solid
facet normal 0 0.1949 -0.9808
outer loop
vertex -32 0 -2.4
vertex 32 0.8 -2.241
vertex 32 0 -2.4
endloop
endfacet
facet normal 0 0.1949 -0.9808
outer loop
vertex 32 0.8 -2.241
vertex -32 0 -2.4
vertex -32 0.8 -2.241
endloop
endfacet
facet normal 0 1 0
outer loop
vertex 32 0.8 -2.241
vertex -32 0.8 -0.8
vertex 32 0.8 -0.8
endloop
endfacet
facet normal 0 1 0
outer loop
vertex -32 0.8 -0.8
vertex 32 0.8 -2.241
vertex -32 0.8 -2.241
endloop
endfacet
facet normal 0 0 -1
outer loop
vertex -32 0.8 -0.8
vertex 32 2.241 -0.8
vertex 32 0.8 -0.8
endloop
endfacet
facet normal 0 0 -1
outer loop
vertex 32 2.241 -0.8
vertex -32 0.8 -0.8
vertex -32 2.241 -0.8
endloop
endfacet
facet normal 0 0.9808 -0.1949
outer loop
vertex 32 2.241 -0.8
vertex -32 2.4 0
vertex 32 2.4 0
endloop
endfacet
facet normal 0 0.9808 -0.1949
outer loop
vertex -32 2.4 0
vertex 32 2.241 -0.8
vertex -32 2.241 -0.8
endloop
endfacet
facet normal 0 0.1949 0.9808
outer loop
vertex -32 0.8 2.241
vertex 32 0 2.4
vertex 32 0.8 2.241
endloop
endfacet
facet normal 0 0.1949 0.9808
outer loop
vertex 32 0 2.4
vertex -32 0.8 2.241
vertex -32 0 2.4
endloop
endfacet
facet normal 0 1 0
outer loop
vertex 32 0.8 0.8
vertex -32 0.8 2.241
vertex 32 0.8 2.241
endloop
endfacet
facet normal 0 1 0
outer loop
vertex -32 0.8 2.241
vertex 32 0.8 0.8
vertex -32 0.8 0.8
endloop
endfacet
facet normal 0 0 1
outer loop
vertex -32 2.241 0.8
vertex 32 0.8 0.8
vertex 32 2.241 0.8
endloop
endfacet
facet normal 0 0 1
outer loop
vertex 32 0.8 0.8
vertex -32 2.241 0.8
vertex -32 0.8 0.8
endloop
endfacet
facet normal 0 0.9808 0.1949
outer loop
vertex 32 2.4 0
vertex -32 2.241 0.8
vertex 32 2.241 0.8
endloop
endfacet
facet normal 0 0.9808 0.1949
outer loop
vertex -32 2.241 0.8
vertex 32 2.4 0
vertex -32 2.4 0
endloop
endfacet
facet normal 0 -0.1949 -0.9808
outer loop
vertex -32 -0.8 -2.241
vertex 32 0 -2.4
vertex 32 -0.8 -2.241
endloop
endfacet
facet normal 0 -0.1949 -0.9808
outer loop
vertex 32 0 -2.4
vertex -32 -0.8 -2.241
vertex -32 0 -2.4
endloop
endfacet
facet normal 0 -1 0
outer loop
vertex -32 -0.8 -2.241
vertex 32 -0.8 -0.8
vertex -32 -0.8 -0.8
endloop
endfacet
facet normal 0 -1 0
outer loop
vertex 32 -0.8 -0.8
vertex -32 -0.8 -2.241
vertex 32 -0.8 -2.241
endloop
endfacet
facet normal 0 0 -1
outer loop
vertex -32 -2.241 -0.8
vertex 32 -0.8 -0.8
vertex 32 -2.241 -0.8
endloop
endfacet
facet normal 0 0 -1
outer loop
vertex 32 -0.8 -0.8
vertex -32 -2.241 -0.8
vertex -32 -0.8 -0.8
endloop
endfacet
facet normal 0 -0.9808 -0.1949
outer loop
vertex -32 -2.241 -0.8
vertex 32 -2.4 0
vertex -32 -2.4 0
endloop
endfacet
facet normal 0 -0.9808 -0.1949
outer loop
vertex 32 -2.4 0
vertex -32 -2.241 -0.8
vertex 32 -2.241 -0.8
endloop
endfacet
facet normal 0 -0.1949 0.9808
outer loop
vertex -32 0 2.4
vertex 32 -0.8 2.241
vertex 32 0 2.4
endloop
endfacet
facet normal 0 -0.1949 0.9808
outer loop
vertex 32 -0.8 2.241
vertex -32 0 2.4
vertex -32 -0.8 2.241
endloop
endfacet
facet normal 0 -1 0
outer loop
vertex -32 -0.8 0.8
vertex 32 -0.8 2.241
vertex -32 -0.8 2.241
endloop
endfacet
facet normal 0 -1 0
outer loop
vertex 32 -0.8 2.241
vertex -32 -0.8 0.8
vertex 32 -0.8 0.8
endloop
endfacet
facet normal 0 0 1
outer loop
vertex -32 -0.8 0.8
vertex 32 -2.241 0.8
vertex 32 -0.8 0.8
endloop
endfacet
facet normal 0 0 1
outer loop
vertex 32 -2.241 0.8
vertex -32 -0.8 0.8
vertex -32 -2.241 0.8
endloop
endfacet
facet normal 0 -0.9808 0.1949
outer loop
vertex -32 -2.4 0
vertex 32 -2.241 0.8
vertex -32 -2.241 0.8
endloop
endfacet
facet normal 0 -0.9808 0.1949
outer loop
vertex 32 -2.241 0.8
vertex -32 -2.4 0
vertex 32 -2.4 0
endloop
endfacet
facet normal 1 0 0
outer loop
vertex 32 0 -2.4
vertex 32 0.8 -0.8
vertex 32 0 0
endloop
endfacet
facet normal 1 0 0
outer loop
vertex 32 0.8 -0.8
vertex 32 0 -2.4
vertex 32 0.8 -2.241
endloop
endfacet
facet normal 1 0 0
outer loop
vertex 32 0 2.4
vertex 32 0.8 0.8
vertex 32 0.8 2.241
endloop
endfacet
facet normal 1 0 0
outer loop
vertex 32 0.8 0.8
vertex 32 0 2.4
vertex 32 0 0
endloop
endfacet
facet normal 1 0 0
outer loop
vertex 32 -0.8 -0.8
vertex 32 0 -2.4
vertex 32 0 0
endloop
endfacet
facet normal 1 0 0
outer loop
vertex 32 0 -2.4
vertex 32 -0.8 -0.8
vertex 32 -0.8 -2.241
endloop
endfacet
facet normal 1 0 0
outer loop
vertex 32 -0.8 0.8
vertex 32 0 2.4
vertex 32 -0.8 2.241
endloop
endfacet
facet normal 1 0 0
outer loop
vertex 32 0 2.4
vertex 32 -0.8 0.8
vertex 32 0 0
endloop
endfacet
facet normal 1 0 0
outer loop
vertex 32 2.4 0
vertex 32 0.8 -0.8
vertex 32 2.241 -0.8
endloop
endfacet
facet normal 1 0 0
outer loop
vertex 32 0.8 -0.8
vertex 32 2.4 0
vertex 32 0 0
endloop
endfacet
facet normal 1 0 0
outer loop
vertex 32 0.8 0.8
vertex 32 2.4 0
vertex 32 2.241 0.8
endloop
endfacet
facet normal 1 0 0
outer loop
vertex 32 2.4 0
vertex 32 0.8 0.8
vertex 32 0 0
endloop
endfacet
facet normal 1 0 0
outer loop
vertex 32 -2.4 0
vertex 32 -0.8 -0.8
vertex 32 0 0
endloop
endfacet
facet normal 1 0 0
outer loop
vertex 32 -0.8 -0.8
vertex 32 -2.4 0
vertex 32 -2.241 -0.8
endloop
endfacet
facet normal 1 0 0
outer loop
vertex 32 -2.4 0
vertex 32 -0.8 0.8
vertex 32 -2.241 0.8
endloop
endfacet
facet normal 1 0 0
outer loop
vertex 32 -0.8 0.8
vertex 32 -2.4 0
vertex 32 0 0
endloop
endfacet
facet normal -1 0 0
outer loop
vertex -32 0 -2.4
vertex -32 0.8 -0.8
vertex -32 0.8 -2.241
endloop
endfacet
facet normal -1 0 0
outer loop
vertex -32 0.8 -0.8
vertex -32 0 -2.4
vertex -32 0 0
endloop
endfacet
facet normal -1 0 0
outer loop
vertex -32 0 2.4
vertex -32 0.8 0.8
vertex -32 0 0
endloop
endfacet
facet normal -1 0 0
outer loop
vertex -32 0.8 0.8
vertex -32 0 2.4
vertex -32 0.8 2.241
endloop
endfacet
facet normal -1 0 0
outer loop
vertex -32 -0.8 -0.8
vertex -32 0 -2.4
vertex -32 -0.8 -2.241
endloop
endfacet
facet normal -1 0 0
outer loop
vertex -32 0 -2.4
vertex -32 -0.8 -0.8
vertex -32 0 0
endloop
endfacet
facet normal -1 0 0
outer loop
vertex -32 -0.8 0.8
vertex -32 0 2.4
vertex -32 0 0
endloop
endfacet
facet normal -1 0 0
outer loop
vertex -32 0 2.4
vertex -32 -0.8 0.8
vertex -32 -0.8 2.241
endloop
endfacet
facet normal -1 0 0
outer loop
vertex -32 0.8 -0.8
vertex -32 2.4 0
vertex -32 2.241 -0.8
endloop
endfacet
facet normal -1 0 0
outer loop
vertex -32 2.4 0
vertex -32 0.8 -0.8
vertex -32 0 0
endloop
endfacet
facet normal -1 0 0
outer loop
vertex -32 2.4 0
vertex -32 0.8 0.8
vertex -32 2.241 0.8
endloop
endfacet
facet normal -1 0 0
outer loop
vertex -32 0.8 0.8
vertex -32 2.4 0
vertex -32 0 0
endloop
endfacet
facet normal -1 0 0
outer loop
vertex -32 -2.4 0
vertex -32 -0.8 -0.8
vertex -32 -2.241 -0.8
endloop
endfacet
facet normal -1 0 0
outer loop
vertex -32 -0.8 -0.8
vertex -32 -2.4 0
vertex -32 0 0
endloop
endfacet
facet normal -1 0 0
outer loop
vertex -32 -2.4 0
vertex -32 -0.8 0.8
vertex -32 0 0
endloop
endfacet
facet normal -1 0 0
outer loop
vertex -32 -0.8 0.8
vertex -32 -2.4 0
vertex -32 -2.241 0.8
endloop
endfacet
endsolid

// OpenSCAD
// file: ../p/axle.scad
use <../lib.scad>
function ldraw_lib__axle() = [
// 0 Axle
// 0 Name: axle.dat
// 0 Author: James Jessiman
// 0 !LDRAW_ORG Primitive UPDATE 2003-01
// 0 !LICENSE Licensed under CC BY 2.0 and CC BY 4.0 : see CAreadme.txt
// 
// 0 BFC CERTIFY CCW
  [0,"BFC","CERTIFY"],
  [0,"BFC","CCW"],
// 
// 0 !HISTORY 2000-04-23 [sbliss] Added conditional edges along outermost diameters
// 0 !HISTORY 2000-05-07 [PTadmin] Official Update 2000-01
// 0 !HISTORY 2002-11-08 [OrionP] Adjusted fit and precision
// 0 !HISTORY 2003-03-12 [PTadmin] Official Update 2003-01
// 0 !HISTORY 2007-06-24 [PTadmin] Header formatted for Contributor Agreement
// 0 !HISTORY 2008-07-01 [PTadmin] Official Update 2008-01
// 
// 
// 5 24 6 0 0 6 1 0 5.602 0 2 5.602 0 -2
  [5,24,6,0,0,6,1,0,5.602,0,2,5.602,0,-2],
// 5 24 0 0 6 0 1 6 2 0 5.602 -2 0 5.602
  [5,24,0,0,6,0,1,6,2,0,5.602,-2,0,5.602],
// 5 24 -6 0 0 -6 1 0 -5.602 0 -2 -5.602 0 2
  [5,24,-6,0,0,-6,1,0,-5.602,0,-2,-5.602,0,2],
// 5 24 0 0 -6 0 1 -6 -2 0 -5.602 2 0 -5.602
  [5,24,0,0,-6,0,1,-6,-2,0,-5.602,2,0,-5.602],
// 
// 2 24 6 0 0 5.602 0 2
  [2,24,6,0,0,5.602,0,2],
// 2 24 5.602 0 2 2 0 2
  [2,24,5.602,0,2,2,0,2],
// 2 24 2 0 2 2 0 5.602
  [2,24,2,0,2,2,0,5.602],
// 2 24 2 0 5.602 0 0 6
  [2,24,2,0,5.602,0,0,6],
// 2 24 -6 0 0 -5.602 0 2
  [2,24,-6,0,0,-5.602,0,2],
// 2 24 -5.602 0 2 -2 0 2
  [2,24,-5.602,0,2,-2,0,2],
// 2 24 -2 0 2 -2 0 5.602
  [2,24,-2,0,2,-2,0,5.602],
// 2 24 -2 0 5.602 -0 0 6
  [2,24,-2,0,5.602,-0,0,6],
// 2 24 6 0 -0 5.602 0 -2
  [2,24,6,0,-0,5.602,0,-2],
// 2 24 5.602 0 -2 2 0 -2
  [2,24,5.602,0,-2,2,0,-2],
// 2 24 2 0 -2 2 0 -5.602
  [2,24,2,0,-2,2,0,-5.602],
// 2 24 2 0 -5.602 0 0 -6
  [2,24,2,0,-5.602,0,0,-6],
// 2 24 -6 0 -0 -5.602 0 -2
  [2,24,-6,0,-0,-5.602,0,-2],
// 2 24 -5.602 0 -2 -2 0 -2
  [2,24,-5.602,0,-2,-2,0,-2],
// 2 24 -2 0 -2 -2 0 -5.602
  [2,24,-2,0,-2,-2,0,-5.602],
// 2 24 -2 0 -5.602 -0 0 -6
  [2,24,-2,0,-5.602,-0,0,-6],
// 2 24 6 1 0 5.602 1 2
  [2,24,6,1,0,5.602,1,2],
// 2 24 5.602 1 2 2 1 2
  [2,24,5.602,1,2,2,1,2],
// 2 24 2 1 2 2 1 5.602
  [2,24,2,1,2,2,1,5.602],
// 2 24 2 1 5.602 0 1 6
  [2,24,2,1,5.602,0,1,6],
// 2 24 -6 1 0 -5.602 1 2
  [2,24,-6,1,0,-5.602,1,2],
// 2 24 -5.602 1 2 -2 1 2
  [2,24,-5.602,1,2,-2,1,2],
// 2 24 -2 1 2 -2 1 5.602
  [2,24,-2,1,2,-2,1,5.602],
// 2 24 -2 1 5.602 -0 1 6
  [2,24,-2,1,5.602,-0,1,6],
// 2 24 6 1 -0 5.602 1 -2
  [2,24,6,1,-0,5.602,1,-2],
// 2 24 5.602 1 -2 2 1 -2
  [2,24,5.602,1,-2,2,1,-2],
// 2 24 2 1 -2 2 1 -5.602
  [2,24,2,1,-2,2,1,-5.602],
// 2 24 2 1 -5.602 0 1 -6
  [2,24,2,1,-5.602,0,1,-6],
// 2 24 -6 1 -0 -5.602 1 -2
  [2,24,-6,1,-0,-5.602,1,-2],
// 2 24 -5.602 1 -2 -2 1 -2
  [2,24,-5.602,1,-2,-2,1,-2],
// 2 24 -2 1 -2 -2 1 -5.602
  [2,24,-2,1,-2,-2,1,-5.602],
// 2 24 -2 1 -5.602 -0 1 -6
  [2,24,-2,1,-5.602,-0,1,-6],
// 
// 2 24 5.602 0 2 5.602 1 2
  [2,24,5.602,0,2,5.602,1,2],
// 2 24 2 0 2 2 1 2
  [2,24,2,0,2,2,1,2],
// 2 24 2 0 5.602 2 1 5.602
  [2,24,2,0,5.602,2,1,5.602],
// 2 24 -5.602 0 2 -5.602 1 2
  [2,24,-5.602,0,2,-5.602,1,2],
// 2 24 -2 0 2 -2 1 2
  [2,24,-2,0,2,-2,1,2],
// 2 24 -2 0 5.602 -2 1 5.602
  [2,24,-2,0,5.602,-2,1,5.602],
// 2 24 5.602 0 -2 5.602 1 -2
  [2,24,5.602,0,-2,5.602,1,-2],
// 2 24 2 0 -2 2 1 -2
  [2,24,2,0,-2,2,1,-2],
// 2 24 2 0 -5.602 2 1 -5.602
  [2,24,2,0,-5.602,2,1,-5.602],
// 2 24 -5.602 0 -2 -5.602 1 -2
  [2,24,-5.602,0,-2,-5.602,1,-2],
// 2 24 -2 0 -2 -2 1 -2
  [2,24,-2,0,-2,-2,1,-2],
// 2 24 -2 0 -5.602 -2 1 -5.602
  [2,24,-2,0,-5.602,-2,1,-5.602],
// 
// 4 16 6 0 0 6 1 0 5.602 1 2 5.602 0 2
  [4,16,6,0,0,6,1,0,5.602,1,2,5.602,0,2],
// 4 16 5.602 0 2 5.602 1 2 2 1 2 2 0 2
  [4,16,5.602,0,2,5.602,1,2,2,1,2,2,0,2],
// 4 16 2 0 2 2 1 2 2 1 5.602 2 0 5.602
  [4,16,2,0,2,2,1,2,2,1,5.602,2,0,5.602],
// 4 16 2 0 5.602 2 1 5.602 0 1 6 0 0 6
  [4,16,2,0,5.602,2,1,5.602,0,1,6,0,0,6],
// 4 16 -6 0 0 -5.602 0 2 -5.602 1 2 -6 1 0
  [4,16,-6,0,0,-5.602,0,2,-5.602,1,2,-6,1,0],
// 4 16 -5.602 0 2 -2 0 2 -2 1 2 -5.602 1 2
  [4,16,-5.602,0,2,-2,0,2,-2,1,2,-5.602,1,2],
// 4 16 -2 0 2 -2 0 5.602 -2 1 5.602 -2 1 2
  [4,16,-2,0,2,-2,0,5.602,-2,1,5.602,-2,1,2],
// 4 16 -2 0 5.602 -0 0 6 -0 1 6 -2 1 5.602
  [4,16,-2,0,5.602,-0,0,6,-0,1,6,-2,1,5.602],
// 4 16 6 0 -0 5.602 0 -2 5.602 1 -2 6 1 -0
  [4,16,6,0,-0,5.602,0,-2,5.602,1,-2,6,1,-0],
// 4 16 5.602 0 -2 2 0 -2 2 1 -2 5.602 1 -2
  [4,16,5.602,0,-2,2,0,-2,2,1,-2,5.602,1,-2],
// 4 16 2 0 -2 2 0 -5.602 2 1 -5.602 2 1 -2
  [4,16,2,0,-2,2,0,-5.602,2,1,-5.602,2,1,-2],
// 4 16 2 0 -5.602 0 0 -6 0 1 -6 2 1 -5.602
  [4,16,2,0,-5.602,0,0,-6,0,1,-6,2,1,-5.602],
// 4 16 -6 0 -0 -6 1 -0 -5.602 1 -2 -5.602 0 -2
  [4,16,-6,0,-0,-6,1,-0,-5.602,1,-2,-5.602,0,-2],
// 4 16 -5.602 0 -2 -5.602 1 -2 -2 1 -2 -2 0 -2
  [4,16,-5.602,0,-2,-5.602,1,-2,-2,1,-2,-2,0,-2],
// 4 16 -2 0 -2 -2 1 -2 -2 1 -5.602 -2 0 -5.602
  [4,16,-2,0,-2,-2,1,-2,-2,1,-5.602,-2,0,-5.602],
// 4 16 -2 0 -5.602 -2 1 -5.602 -0 1 -6 -0 0 -6
  [4,16,-2,0,-5.602,-2,1,-5.602,-0,1,-6,-0,0,-6],
// 
// 4 16 6 0 0 5.602 0 2 2 0 2 0 0 0
  [4,16,6,0,0,5.602,0,2,2,0,2,0,0,0],
// 4 16 -6 0 0 0 0 0 -2 0 2 -5.602 0 2
  [4,16,-6,0,0,0,0,0,-2,0,2,-5.602,0,2],
// 4 16 6 0 0 0 0 0 2 0 -2 5.602 0 -2
  [4,16,6,0,0,0,0,0,2,0,-2,5.602,0,-2],
// 4 16 -6 0 0 -5.602 0 -2 -2 0 -2 0 0 0
  [4,16,-6,0,0,-5.602,0,-2,-2,0,-2,0,0,0],
// 4 16 0 0 6 0 0 0 2 0 2 2 0 5.602
  [4,16,0,0,6,0,0,0,2,0,2,2,0,5.602],
// 4 16 0 0 6 -2 0 5.602 -2 0 2 0 0 0
  [4,16,0,0,6,-2,0,5.602,-2,0,2,0,0,0],
// 4 16 0 0 -6 2 0 -5.602 2 0 -2 0 0 0
  [4,16,0,0,-6,2,0,-5.602,2,0,-2,0,0,0],
// 4 16 0 0 -6 0 0 0 -2 0 -2 -2 0 -5.602
  [4,16,0,0,-6,0,0,0,-2,0,-2,-2,0,-5.602],
// 4 16 6 1 0 0 1 0 2 1 2 5.602 1 2
  [4,16,6,1,0,0,1,0,2,1,2,5.602,1,2],
// 4 16 -6 1 0 -5.602 1 2 -2 1 2 0 1 0
  [4,16,-6,1,0,-5.602,1,2,-2,1,2,0,1,0],
// 4 16 6 1 0 5.602 1 -2 2 1 -2 0 1 0
  [4,16,6,1,0,5.602,1,-2,2,1,-2,0,1,0],
// 4 16 -6 1 0 0 1 0 -2 1 -2 -5.602 1 -2
  [4,16,-6,1,0,0,1,0,-2,1,-2,-5.602,1,-2],
// 4 16 0 1 6 2 1 5.602 2 1 2 0 1 0
  [4,16,0,1,6,2,1,5.602,2,1,2,0,1,0],
// 4 16 0 1 6 0 1 0 -2 1 2 -2 1 5.602
  [4,16,0,1,6,0,1,0,-2,1,2,-2,1,5.602],
// 4 16 0 1 -6 0 1 0 2 1 -2 2 1 -5.602
  [4,16,0,1,-6,0,1,0,2,1,-2,2,1,-5.602],
// 4 16 0 1 -6 -2 1 -5.602 -2 1 -2 0 1 0
  [4,16,0,1,-6,-2,1,-5.602,-2,1,-2,0,1,0],
// 0
];
module ldraw_lib__axle(step=0, col=false, unit=2/5, alt=false, line=0.2, solid=!$preview)
    makepoly(ldraw_lib__axle(), step=step, col=col, unit=unit, alt=alt, line=line, solid=solid);
ldraw_lib__axle(line=0.2);
// main file
use <../lib.scad>
use <../p/axle.scad>
function ldraw_lib__3707() = [
// 0 Technic Axle  8
// 0 Name: 3707.dat
// 0 Author: James Jessiman
// 0 !LDRAW_ORG Part UPDATE 2005-01
// 0 !LICENSE Licensed under CC BY 2.0 and CC BY 4.0 : see CAreadme.txt
// 
// 0 BFC CERTIFY CCW
  [0,"BFC","CERTIFY"],
  [0,"BFC","CCW"],
// 
// 0 !HISTORY 2004-07-11 [guyvivan] BFC'ed
// 0 !HISTORY 2005-12-28 [PTadmin] Official Update 2005-01
// 0 !HISTORY 2007-06-29 [PTadmin] Header formatted for Contributor Agreement
// 0 !HISTORY 2008-07-01 [PTadmin] Official Update 2008-01
// 
// 
// 1 16 80 0 0 0 -160 0 1 0 0 0 0 1 axle.dat
  [1,16,80,0,0,0,-160,0,1,0,0,0,0,1, ldraw_lib__axle()],
// 0
// 
];
module ldraw_lib__3707(step=0, col=false, unit=2/5, alt=false, line=0.2, solid=!$preview)
    makepoly(ldraw_lib__3707(), step=step, col=col, unit=unit, alt=alt, line=line, solid=solid);
ldraw_lib__3707(line=0.2);
